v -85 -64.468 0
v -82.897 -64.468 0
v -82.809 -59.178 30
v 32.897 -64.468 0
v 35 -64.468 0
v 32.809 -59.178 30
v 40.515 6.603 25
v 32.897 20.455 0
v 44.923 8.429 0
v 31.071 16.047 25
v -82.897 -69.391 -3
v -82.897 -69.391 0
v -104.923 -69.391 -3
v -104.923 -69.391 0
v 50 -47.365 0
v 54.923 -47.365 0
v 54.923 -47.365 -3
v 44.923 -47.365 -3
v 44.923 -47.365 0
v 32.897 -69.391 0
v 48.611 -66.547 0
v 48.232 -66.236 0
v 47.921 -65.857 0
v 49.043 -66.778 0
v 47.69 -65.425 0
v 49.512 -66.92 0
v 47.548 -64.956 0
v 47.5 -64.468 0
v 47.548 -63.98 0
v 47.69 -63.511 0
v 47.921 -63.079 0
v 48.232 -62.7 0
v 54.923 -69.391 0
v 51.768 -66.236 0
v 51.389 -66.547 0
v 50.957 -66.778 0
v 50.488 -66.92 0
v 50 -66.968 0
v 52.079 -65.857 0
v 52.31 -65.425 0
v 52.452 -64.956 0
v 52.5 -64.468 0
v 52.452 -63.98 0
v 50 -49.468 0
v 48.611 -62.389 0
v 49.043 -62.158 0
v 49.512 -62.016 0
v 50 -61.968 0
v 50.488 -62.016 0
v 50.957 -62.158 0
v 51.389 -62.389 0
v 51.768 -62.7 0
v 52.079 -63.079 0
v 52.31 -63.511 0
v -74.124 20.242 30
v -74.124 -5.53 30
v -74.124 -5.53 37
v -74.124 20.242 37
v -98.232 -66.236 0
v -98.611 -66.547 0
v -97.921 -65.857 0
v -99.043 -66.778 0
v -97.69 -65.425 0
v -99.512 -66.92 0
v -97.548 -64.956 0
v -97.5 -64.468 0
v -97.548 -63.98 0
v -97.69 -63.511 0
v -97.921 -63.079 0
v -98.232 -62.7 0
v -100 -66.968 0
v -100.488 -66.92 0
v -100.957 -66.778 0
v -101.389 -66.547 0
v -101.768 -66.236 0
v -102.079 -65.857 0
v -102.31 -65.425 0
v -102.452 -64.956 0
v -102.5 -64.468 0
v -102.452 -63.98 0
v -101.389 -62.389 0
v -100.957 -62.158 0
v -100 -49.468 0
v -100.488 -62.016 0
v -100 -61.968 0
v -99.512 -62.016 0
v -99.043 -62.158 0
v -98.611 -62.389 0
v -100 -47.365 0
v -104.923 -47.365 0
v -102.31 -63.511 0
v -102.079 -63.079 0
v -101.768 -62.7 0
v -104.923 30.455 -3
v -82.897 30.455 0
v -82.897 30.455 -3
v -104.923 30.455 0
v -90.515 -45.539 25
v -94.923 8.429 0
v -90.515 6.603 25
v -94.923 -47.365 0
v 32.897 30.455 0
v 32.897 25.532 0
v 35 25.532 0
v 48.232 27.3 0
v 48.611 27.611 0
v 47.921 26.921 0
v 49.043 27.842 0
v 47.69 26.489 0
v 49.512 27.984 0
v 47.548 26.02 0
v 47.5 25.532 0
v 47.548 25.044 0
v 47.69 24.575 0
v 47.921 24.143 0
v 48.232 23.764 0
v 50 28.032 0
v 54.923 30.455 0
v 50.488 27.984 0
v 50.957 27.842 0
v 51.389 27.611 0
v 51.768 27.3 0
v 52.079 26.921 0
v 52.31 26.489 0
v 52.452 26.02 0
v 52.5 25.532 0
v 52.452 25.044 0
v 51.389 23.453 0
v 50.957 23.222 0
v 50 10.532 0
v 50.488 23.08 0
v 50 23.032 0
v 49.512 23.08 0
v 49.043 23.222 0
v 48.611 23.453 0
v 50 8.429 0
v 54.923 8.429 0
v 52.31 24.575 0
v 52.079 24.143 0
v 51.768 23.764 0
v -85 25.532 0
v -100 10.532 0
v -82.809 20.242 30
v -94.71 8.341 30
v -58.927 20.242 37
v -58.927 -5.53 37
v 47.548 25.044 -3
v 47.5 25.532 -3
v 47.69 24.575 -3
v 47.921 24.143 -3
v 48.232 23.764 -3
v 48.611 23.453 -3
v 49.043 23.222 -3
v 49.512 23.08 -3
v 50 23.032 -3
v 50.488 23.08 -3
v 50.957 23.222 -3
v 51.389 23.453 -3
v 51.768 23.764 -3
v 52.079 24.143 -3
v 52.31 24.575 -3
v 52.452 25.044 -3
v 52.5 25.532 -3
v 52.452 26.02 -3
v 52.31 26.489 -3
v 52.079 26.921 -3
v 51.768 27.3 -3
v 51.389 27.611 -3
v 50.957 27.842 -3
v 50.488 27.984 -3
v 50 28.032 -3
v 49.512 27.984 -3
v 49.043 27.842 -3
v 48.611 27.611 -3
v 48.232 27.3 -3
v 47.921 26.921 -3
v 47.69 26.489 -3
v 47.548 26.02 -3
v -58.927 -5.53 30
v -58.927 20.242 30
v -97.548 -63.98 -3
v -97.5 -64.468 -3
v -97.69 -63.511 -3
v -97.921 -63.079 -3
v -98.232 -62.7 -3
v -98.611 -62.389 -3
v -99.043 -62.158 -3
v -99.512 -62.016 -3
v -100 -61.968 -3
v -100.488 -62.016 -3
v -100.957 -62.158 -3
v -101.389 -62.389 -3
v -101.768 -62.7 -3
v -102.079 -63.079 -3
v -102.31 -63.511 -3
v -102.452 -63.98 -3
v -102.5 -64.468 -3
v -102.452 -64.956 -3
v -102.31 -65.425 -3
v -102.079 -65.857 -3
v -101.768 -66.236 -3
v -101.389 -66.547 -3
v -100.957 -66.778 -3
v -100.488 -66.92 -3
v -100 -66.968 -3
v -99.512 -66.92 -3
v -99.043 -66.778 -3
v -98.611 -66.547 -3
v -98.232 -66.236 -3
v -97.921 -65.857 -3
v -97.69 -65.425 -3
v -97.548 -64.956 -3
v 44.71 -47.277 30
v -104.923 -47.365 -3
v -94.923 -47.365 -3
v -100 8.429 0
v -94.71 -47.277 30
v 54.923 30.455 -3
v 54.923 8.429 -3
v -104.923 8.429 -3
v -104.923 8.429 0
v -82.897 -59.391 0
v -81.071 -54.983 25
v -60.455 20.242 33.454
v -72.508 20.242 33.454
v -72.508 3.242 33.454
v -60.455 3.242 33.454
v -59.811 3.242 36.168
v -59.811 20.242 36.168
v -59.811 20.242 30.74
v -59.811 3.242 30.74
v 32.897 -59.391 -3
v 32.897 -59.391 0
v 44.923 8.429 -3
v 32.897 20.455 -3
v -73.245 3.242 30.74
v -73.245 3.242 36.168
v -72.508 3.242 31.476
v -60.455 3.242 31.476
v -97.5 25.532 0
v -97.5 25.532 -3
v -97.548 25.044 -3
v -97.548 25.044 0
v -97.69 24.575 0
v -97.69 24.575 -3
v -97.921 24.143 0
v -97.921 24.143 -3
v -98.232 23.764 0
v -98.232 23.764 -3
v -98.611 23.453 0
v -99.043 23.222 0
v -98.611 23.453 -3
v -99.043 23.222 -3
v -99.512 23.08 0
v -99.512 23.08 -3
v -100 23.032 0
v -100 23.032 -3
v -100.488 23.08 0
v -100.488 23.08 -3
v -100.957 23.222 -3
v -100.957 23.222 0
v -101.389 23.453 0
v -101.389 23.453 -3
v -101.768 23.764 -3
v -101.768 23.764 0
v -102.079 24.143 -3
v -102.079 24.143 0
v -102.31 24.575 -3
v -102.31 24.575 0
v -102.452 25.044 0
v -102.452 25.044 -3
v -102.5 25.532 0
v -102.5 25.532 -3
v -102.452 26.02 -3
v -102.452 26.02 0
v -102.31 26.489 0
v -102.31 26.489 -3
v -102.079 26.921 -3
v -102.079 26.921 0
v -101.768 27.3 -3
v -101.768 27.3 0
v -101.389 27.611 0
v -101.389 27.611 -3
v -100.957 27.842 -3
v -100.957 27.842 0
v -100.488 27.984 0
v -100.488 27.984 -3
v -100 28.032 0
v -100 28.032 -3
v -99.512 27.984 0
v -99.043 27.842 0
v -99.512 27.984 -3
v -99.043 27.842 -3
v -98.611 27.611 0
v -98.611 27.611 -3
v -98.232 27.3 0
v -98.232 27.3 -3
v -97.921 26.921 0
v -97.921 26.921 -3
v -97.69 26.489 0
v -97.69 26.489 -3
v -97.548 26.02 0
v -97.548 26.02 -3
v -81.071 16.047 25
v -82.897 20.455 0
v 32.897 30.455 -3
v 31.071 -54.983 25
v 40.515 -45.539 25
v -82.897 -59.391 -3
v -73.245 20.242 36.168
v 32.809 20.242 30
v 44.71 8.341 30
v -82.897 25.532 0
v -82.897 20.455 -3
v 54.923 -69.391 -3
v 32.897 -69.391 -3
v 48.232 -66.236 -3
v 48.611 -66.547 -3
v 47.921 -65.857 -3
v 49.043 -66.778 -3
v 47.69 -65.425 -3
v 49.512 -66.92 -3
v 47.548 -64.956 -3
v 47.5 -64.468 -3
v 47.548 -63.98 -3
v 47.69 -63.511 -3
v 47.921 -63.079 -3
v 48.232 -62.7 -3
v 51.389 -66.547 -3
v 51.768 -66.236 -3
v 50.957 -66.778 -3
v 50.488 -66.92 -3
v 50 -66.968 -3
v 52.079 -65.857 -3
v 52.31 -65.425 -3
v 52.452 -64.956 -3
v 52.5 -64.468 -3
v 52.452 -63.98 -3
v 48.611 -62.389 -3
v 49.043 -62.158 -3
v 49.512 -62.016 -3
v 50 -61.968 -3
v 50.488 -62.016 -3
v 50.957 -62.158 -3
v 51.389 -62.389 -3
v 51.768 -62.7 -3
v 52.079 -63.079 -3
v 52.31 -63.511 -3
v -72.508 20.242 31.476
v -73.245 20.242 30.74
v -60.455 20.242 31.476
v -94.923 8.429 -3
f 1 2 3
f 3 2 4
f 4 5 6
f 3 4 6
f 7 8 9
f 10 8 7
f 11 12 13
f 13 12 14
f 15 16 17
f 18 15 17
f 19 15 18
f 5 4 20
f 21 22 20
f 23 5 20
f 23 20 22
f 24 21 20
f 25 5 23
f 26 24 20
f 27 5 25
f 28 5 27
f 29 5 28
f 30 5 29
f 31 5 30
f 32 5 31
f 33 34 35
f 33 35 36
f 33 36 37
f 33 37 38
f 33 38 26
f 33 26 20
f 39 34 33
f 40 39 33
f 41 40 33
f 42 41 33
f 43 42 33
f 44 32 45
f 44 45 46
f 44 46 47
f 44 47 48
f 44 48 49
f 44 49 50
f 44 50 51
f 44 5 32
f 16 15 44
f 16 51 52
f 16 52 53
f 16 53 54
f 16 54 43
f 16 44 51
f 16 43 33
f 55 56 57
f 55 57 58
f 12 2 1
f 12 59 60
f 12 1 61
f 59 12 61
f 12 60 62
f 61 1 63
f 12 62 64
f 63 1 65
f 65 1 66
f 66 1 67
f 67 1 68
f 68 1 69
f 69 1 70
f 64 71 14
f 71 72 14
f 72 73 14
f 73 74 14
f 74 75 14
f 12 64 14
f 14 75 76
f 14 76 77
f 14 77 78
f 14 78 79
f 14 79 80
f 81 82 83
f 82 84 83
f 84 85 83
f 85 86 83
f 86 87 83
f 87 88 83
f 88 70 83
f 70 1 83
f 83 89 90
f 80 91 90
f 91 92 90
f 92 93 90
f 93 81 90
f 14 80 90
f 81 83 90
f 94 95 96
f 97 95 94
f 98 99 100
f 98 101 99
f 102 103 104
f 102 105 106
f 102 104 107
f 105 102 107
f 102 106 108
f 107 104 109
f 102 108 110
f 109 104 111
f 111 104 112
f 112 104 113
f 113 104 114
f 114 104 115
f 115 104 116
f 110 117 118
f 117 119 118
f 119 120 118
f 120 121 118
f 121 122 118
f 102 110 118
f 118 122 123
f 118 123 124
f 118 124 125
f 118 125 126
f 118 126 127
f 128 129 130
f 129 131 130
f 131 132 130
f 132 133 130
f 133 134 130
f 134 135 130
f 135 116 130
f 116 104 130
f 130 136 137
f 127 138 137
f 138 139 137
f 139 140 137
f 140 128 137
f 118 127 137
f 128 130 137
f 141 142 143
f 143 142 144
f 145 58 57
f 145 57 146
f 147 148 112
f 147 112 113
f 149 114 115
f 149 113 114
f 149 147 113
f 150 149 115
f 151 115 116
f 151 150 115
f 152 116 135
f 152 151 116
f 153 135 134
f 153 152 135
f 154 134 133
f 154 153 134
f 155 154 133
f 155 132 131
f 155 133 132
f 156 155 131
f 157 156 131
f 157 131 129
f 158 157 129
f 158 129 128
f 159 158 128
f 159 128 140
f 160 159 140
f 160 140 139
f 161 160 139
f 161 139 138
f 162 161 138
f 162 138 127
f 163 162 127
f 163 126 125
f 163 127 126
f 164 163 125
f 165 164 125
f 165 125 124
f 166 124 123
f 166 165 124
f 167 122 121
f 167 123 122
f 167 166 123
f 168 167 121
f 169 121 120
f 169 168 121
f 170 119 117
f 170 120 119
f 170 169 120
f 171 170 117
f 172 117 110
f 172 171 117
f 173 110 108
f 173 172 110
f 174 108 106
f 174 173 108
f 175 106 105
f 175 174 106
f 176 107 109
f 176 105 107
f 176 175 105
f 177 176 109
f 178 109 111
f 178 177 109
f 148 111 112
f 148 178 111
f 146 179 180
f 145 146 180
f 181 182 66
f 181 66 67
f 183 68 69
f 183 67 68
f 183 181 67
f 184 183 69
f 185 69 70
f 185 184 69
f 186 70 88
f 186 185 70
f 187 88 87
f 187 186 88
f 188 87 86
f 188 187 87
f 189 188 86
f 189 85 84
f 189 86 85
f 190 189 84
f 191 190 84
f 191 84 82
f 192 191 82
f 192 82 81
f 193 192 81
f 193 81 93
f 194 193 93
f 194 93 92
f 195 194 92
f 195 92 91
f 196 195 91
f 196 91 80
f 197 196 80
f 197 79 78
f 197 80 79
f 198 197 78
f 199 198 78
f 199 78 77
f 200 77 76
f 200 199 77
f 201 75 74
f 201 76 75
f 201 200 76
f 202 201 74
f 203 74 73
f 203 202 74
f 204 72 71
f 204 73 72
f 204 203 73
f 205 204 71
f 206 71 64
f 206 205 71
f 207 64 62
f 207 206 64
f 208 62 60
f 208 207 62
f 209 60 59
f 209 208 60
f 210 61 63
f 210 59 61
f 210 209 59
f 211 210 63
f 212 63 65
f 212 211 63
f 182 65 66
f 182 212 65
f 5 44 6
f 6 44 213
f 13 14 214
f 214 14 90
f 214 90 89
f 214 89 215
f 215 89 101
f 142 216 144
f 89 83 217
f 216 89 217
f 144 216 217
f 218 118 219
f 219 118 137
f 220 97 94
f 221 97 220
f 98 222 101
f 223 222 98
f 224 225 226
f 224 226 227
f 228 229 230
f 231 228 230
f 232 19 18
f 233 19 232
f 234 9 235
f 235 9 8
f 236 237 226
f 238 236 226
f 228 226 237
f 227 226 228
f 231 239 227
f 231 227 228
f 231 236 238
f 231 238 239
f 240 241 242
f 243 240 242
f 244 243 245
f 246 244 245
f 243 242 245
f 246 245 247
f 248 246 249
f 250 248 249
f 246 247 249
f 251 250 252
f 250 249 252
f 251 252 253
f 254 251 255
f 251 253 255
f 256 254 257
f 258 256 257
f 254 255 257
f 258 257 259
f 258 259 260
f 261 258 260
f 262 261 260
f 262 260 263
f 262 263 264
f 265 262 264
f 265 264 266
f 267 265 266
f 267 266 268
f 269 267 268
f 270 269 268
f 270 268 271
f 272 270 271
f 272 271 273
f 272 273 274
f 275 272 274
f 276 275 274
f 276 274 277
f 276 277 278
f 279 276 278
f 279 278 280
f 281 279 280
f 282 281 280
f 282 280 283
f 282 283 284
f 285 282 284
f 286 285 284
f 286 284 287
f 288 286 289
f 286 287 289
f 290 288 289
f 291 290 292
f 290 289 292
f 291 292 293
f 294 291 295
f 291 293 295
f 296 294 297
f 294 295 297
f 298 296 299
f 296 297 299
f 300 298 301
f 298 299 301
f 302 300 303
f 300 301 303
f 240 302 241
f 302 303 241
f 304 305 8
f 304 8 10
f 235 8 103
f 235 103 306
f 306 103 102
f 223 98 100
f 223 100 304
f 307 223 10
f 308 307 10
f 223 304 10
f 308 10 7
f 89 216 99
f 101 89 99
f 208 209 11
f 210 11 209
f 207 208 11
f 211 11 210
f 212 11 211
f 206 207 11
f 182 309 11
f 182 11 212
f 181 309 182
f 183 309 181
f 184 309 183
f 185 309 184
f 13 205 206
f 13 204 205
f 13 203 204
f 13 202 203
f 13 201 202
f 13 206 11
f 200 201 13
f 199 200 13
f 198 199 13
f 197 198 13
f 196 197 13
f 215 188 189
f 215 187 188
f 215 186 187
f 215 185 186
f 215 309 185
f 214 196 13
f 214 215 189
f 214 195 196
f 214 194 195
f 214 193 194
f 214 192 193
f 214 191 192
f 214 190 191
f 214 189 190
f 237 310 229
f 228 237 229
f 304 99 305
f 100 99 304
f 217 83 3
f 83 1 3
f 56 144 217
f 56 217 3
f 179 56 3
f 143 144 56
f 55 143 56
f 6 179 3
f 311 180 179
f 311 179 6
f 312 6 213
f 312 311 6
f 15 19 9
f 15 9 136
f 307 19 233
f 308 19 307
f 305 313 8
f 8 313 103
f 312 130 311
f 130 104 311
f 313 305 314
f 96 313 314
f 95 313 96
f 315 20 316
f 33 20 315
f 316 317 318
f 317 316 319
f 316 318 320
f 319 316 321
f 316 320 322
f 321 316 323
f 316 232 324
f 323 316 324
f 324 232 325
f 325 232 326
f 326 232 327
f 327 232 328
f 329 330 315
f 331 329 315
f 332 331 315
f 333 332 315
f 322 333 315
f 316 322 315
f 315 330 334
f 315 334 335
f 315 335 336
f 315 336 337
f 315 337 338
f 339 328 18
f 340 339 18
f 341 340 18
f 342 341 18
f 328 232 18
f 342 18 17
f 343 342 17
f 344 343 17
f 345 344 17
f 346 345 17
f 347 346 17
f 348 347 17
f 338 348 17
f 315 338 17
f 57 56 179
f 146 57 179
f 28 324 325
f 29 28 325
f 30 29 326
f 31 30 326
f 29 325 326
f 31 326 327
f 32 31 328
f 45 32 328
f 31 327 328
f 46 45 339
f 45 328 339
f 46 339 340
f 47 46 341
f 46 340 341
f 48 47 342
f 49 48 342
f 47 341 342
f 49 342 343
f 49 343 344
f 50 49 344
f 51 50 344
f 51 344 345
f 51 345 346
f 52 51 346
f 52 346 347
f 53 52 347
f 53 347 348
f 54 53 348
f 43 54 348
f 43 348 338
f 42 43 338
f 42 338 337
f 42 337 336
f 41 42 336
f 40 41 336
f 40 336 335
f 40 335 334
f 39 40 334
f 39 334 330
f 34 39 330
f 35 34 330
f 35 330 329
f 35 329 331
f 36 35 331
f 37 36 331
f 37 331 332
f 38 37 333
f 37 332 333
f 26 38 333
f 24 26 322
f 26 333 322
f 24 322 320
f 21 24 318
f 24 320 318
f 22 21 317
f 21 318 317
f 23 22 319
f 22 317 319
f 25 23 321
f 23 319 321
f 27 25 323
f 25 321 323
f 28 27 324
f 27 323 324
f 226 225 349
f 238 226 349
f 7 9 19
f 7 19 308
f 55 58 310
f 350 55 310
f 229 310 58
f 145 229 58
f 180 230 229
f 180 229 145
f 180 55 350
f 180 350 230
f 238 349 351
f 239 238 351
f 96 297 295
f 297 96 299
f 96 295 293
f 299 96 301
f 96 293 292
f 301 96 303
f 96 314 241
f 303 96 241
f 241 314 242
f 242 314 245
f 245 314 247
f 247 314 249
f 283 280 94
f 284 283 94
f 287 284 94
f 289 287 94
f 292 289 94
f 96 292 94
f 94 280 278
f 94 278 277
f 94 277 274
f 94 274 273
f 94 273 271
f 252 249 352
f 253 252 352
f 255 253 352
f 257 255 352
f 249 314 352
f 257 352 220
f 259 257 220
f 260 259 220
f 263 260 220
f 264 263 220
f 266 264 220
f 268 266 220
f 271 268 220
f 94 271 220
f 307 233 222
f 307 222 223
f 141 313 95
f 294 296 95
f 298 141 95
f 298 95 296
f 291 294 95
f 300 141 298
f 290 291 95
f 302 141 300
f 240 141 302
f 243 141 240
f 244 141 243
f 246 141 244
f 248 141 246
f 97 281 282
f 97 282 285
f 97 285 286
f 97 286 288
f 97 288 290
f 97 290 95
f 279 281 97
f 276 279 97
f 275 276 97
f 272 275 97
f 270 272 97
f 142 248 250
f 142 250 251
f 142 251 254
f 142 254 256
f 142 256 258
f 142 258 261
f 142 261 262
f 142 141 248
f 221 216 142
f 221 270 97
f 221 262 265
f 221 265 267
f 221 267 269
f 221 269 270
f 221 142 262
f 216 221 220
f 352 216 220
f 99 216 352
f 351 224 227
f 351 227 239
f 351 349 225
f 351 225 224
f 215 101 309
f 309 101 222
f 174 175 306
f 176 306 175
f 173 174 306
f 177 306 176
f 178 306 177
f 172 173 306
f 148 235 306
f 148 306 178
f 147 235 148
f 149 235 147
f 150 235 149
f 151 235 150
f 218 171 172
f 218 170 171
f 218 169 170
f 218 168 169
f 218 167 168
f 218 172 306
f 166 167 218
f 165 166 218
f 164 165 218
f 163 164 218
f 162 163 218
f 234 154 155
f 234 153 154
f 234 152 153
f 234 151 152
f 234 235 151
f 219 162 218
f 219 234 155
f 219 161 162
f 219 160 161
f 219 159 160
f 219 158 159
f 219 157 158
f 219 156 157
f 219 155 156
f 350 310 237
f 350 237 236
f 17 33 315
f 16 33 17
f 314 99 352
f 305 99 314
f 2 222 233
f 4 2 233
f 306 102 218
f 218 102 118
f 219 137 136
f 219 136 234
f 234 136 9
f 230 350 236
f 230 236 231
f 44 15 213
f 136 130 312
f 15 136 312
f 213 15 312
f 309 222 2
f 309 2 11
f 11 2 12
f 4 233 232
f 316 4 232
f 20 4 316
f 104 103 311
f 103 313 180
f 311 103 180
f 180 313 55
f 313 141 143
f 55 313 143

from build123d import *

# Parameters (mm, degrees)
BOSS_EXTRUDE1_DEPTH      = 30
BOSS_EXTRUDE1_TAPER      = 10
SHELL1_T                 = -5
SKETCH6_W                = 15.197518051
SKETCH6_H                = 25.772318446
BOSS_EXTRUDE4_DEPTH      = 7
SKETCH7_W                = 13.433844537
SKETCH7_H                = 5.428745395
SKETCH7_W_2              = 12.053655029
SKETCH7_H_2              = 1.978271627
CUT_EXTRUDE2_DEPTH       = 17
BOSS_EXTRUDE6_DEPTH      = 3
MIRROR9_COPY_1_DEPTH     = 3
CUT_EXTRUDE4_START       = -4
SKETCH12_R               = 2.5
CUT_EXTRUDE4_DEPTH       = 42
MIRROR11_START           = -4
MIRROR11_COPY_1_SKETCH_R = 2.5
MIRROR11_COPY_1_DEPTH    = 42


with BuildPart() as part:
    # Sketch1 → Boss-Extrude1 (new body)
    with BuildSketch(Plane.XY):
        Polygon((-100, 10.531931481), (-100, -49.468068519), (-85, -64.468068519), (35, -64.468068519), (50, -49.468068519), (50, 10.531931481), (35, 25.531931481), (-85, 25.531931481), align=None)
    extrude(amount=BOSS_EXTRUDE1_DEPTH, taper=BOSS_EXTRUDE1_TAPER)

    # Shell1
    shell1_openings = [part.faces().sort_by_distance(p)[0] for p in [
        (-25, -19.468068519, 0),
    ]]
    offset(amount=SHELL1_T, openings=shell1_openings, kind=Kind.INTERSECTION)

    # Sketch6 → Boss-Extrude4 (add)
    with BuildSketch(Plane.XY.offset(30)):
        with Locations((-66.525501272, 7.355962837)):
            Rectangle(SKETCH6_W, SKETCH6_H)
    extrude(amount=BOSS_EXTRUDE4_DEPTH)

    # Sketch7 → Cut-Extrude2 (cut)
    with BuildSketch(Plane(origin=(0, 20.24212206, 0), x_dir=(1, 0, 0), z_dir=(0, 1, 0))):
        with Locations((-66.527599538, -33.454113167)):
            Rectangle(SKETCH7_W, SKETCH7_H)
        with Locations((-66.481593222, -32.464977353)):
            Rectangle(SKETCH7_W_2, SKETCH7_H_2, mode=Mode.SUBTRACT)
    extrude(amount=-CUT_EXTRUDE2_DEPTH, mode=Mode.SUBTRACT)

    # Sketch11 → Boss-Extrude6 (add)
    with BuildSketch(Plane(origin=(0, 0, 0), x_dir=(-1, 0, 0), z_dir=(0, 0, -1))):
        Polygon((94.922866941, -47.365051148), (82.896982629, -59.390935459), (82.896982629, -69.390935459), (104.922866941, -69.390935459), (104.922866941, -47.365051148), align=None)
    boss_extrude6 = extrude(amount=BOSS_EXTRUDE6_DEPTH)

    # Mirror8: Boss-Extrude6 across plane
    add(boss_extrude6.mirror(Plane(origin=(-25, 0, 0), x_dir=(0, 0, 1), z_dir=(1, 0, 0))))

    # Mirror9: Boss-Extrude6 across plane
    add(boss_extrude6.mirror(Plane.ZX.offset(-19.468068519)))

    # Mirror9 copy 1 sketch → Mirror9 copy 1 (add)
    with BuildSketch(Plane(origin=(-50, -38.936137038, 0), x_dir=(1, 0, 0), z_dir=(0, 0, -1))):
        Polygon((94.922866941, -47.365051148), (82.896982629, -59.390935459), (82.896982629, -69.390935459), (104.922866941, -69.390935459), (104.922866941, -47.365051148), align=None)
    extrude(amount=MIRROR9_COPY_1_DEPTH)

    # Sketch12 → Cut-Extrude4 (cut)
    with BuildSketch(Plane.XY.offset(CUT_EXTRUDE4_START)):
        with Locations((-100, -64.468068519)):
            Circle(SKETCH12_R)
    cut_extrude4 = extrude(amount=CUT_EXTRUDE4_DEPTH, mode=Mode.SUBTRACT)

    # Mirror10: Cut-Extrude4 across plane
    add(cut_extrude4.mirror(Plane(origin=(-25, 0, 0), x_dir=(0, 0, 1), z_dir=(1, 0, 0))), mode=Mode.SUBTRACT)

    # Mirror11: Cut-Extrude4 across plane
    add(cut_extrude4.mirror(Plane.ZX.offset(-19.468068519)), mode=Mode.SUBTRACT)

    # Mirror11 copy 1 sketch → Mirror11 copy 1 (cut)
    with BuildSketch(Plane(origin=(-50, -38.936137038, 0), x_dir=(-1, 0, 0), z_dir=(0, 0, 1)).offset(MIRROR11_START)):
        with Locations((-100, -64.468068519)):
            Circle(MIRROR11_COPY_1_SKETCH_R)
    extrude(amount=MIRROR11_COPY_1_DEPTH, mode=Mode.SUBTRACT)


solid = part.part
